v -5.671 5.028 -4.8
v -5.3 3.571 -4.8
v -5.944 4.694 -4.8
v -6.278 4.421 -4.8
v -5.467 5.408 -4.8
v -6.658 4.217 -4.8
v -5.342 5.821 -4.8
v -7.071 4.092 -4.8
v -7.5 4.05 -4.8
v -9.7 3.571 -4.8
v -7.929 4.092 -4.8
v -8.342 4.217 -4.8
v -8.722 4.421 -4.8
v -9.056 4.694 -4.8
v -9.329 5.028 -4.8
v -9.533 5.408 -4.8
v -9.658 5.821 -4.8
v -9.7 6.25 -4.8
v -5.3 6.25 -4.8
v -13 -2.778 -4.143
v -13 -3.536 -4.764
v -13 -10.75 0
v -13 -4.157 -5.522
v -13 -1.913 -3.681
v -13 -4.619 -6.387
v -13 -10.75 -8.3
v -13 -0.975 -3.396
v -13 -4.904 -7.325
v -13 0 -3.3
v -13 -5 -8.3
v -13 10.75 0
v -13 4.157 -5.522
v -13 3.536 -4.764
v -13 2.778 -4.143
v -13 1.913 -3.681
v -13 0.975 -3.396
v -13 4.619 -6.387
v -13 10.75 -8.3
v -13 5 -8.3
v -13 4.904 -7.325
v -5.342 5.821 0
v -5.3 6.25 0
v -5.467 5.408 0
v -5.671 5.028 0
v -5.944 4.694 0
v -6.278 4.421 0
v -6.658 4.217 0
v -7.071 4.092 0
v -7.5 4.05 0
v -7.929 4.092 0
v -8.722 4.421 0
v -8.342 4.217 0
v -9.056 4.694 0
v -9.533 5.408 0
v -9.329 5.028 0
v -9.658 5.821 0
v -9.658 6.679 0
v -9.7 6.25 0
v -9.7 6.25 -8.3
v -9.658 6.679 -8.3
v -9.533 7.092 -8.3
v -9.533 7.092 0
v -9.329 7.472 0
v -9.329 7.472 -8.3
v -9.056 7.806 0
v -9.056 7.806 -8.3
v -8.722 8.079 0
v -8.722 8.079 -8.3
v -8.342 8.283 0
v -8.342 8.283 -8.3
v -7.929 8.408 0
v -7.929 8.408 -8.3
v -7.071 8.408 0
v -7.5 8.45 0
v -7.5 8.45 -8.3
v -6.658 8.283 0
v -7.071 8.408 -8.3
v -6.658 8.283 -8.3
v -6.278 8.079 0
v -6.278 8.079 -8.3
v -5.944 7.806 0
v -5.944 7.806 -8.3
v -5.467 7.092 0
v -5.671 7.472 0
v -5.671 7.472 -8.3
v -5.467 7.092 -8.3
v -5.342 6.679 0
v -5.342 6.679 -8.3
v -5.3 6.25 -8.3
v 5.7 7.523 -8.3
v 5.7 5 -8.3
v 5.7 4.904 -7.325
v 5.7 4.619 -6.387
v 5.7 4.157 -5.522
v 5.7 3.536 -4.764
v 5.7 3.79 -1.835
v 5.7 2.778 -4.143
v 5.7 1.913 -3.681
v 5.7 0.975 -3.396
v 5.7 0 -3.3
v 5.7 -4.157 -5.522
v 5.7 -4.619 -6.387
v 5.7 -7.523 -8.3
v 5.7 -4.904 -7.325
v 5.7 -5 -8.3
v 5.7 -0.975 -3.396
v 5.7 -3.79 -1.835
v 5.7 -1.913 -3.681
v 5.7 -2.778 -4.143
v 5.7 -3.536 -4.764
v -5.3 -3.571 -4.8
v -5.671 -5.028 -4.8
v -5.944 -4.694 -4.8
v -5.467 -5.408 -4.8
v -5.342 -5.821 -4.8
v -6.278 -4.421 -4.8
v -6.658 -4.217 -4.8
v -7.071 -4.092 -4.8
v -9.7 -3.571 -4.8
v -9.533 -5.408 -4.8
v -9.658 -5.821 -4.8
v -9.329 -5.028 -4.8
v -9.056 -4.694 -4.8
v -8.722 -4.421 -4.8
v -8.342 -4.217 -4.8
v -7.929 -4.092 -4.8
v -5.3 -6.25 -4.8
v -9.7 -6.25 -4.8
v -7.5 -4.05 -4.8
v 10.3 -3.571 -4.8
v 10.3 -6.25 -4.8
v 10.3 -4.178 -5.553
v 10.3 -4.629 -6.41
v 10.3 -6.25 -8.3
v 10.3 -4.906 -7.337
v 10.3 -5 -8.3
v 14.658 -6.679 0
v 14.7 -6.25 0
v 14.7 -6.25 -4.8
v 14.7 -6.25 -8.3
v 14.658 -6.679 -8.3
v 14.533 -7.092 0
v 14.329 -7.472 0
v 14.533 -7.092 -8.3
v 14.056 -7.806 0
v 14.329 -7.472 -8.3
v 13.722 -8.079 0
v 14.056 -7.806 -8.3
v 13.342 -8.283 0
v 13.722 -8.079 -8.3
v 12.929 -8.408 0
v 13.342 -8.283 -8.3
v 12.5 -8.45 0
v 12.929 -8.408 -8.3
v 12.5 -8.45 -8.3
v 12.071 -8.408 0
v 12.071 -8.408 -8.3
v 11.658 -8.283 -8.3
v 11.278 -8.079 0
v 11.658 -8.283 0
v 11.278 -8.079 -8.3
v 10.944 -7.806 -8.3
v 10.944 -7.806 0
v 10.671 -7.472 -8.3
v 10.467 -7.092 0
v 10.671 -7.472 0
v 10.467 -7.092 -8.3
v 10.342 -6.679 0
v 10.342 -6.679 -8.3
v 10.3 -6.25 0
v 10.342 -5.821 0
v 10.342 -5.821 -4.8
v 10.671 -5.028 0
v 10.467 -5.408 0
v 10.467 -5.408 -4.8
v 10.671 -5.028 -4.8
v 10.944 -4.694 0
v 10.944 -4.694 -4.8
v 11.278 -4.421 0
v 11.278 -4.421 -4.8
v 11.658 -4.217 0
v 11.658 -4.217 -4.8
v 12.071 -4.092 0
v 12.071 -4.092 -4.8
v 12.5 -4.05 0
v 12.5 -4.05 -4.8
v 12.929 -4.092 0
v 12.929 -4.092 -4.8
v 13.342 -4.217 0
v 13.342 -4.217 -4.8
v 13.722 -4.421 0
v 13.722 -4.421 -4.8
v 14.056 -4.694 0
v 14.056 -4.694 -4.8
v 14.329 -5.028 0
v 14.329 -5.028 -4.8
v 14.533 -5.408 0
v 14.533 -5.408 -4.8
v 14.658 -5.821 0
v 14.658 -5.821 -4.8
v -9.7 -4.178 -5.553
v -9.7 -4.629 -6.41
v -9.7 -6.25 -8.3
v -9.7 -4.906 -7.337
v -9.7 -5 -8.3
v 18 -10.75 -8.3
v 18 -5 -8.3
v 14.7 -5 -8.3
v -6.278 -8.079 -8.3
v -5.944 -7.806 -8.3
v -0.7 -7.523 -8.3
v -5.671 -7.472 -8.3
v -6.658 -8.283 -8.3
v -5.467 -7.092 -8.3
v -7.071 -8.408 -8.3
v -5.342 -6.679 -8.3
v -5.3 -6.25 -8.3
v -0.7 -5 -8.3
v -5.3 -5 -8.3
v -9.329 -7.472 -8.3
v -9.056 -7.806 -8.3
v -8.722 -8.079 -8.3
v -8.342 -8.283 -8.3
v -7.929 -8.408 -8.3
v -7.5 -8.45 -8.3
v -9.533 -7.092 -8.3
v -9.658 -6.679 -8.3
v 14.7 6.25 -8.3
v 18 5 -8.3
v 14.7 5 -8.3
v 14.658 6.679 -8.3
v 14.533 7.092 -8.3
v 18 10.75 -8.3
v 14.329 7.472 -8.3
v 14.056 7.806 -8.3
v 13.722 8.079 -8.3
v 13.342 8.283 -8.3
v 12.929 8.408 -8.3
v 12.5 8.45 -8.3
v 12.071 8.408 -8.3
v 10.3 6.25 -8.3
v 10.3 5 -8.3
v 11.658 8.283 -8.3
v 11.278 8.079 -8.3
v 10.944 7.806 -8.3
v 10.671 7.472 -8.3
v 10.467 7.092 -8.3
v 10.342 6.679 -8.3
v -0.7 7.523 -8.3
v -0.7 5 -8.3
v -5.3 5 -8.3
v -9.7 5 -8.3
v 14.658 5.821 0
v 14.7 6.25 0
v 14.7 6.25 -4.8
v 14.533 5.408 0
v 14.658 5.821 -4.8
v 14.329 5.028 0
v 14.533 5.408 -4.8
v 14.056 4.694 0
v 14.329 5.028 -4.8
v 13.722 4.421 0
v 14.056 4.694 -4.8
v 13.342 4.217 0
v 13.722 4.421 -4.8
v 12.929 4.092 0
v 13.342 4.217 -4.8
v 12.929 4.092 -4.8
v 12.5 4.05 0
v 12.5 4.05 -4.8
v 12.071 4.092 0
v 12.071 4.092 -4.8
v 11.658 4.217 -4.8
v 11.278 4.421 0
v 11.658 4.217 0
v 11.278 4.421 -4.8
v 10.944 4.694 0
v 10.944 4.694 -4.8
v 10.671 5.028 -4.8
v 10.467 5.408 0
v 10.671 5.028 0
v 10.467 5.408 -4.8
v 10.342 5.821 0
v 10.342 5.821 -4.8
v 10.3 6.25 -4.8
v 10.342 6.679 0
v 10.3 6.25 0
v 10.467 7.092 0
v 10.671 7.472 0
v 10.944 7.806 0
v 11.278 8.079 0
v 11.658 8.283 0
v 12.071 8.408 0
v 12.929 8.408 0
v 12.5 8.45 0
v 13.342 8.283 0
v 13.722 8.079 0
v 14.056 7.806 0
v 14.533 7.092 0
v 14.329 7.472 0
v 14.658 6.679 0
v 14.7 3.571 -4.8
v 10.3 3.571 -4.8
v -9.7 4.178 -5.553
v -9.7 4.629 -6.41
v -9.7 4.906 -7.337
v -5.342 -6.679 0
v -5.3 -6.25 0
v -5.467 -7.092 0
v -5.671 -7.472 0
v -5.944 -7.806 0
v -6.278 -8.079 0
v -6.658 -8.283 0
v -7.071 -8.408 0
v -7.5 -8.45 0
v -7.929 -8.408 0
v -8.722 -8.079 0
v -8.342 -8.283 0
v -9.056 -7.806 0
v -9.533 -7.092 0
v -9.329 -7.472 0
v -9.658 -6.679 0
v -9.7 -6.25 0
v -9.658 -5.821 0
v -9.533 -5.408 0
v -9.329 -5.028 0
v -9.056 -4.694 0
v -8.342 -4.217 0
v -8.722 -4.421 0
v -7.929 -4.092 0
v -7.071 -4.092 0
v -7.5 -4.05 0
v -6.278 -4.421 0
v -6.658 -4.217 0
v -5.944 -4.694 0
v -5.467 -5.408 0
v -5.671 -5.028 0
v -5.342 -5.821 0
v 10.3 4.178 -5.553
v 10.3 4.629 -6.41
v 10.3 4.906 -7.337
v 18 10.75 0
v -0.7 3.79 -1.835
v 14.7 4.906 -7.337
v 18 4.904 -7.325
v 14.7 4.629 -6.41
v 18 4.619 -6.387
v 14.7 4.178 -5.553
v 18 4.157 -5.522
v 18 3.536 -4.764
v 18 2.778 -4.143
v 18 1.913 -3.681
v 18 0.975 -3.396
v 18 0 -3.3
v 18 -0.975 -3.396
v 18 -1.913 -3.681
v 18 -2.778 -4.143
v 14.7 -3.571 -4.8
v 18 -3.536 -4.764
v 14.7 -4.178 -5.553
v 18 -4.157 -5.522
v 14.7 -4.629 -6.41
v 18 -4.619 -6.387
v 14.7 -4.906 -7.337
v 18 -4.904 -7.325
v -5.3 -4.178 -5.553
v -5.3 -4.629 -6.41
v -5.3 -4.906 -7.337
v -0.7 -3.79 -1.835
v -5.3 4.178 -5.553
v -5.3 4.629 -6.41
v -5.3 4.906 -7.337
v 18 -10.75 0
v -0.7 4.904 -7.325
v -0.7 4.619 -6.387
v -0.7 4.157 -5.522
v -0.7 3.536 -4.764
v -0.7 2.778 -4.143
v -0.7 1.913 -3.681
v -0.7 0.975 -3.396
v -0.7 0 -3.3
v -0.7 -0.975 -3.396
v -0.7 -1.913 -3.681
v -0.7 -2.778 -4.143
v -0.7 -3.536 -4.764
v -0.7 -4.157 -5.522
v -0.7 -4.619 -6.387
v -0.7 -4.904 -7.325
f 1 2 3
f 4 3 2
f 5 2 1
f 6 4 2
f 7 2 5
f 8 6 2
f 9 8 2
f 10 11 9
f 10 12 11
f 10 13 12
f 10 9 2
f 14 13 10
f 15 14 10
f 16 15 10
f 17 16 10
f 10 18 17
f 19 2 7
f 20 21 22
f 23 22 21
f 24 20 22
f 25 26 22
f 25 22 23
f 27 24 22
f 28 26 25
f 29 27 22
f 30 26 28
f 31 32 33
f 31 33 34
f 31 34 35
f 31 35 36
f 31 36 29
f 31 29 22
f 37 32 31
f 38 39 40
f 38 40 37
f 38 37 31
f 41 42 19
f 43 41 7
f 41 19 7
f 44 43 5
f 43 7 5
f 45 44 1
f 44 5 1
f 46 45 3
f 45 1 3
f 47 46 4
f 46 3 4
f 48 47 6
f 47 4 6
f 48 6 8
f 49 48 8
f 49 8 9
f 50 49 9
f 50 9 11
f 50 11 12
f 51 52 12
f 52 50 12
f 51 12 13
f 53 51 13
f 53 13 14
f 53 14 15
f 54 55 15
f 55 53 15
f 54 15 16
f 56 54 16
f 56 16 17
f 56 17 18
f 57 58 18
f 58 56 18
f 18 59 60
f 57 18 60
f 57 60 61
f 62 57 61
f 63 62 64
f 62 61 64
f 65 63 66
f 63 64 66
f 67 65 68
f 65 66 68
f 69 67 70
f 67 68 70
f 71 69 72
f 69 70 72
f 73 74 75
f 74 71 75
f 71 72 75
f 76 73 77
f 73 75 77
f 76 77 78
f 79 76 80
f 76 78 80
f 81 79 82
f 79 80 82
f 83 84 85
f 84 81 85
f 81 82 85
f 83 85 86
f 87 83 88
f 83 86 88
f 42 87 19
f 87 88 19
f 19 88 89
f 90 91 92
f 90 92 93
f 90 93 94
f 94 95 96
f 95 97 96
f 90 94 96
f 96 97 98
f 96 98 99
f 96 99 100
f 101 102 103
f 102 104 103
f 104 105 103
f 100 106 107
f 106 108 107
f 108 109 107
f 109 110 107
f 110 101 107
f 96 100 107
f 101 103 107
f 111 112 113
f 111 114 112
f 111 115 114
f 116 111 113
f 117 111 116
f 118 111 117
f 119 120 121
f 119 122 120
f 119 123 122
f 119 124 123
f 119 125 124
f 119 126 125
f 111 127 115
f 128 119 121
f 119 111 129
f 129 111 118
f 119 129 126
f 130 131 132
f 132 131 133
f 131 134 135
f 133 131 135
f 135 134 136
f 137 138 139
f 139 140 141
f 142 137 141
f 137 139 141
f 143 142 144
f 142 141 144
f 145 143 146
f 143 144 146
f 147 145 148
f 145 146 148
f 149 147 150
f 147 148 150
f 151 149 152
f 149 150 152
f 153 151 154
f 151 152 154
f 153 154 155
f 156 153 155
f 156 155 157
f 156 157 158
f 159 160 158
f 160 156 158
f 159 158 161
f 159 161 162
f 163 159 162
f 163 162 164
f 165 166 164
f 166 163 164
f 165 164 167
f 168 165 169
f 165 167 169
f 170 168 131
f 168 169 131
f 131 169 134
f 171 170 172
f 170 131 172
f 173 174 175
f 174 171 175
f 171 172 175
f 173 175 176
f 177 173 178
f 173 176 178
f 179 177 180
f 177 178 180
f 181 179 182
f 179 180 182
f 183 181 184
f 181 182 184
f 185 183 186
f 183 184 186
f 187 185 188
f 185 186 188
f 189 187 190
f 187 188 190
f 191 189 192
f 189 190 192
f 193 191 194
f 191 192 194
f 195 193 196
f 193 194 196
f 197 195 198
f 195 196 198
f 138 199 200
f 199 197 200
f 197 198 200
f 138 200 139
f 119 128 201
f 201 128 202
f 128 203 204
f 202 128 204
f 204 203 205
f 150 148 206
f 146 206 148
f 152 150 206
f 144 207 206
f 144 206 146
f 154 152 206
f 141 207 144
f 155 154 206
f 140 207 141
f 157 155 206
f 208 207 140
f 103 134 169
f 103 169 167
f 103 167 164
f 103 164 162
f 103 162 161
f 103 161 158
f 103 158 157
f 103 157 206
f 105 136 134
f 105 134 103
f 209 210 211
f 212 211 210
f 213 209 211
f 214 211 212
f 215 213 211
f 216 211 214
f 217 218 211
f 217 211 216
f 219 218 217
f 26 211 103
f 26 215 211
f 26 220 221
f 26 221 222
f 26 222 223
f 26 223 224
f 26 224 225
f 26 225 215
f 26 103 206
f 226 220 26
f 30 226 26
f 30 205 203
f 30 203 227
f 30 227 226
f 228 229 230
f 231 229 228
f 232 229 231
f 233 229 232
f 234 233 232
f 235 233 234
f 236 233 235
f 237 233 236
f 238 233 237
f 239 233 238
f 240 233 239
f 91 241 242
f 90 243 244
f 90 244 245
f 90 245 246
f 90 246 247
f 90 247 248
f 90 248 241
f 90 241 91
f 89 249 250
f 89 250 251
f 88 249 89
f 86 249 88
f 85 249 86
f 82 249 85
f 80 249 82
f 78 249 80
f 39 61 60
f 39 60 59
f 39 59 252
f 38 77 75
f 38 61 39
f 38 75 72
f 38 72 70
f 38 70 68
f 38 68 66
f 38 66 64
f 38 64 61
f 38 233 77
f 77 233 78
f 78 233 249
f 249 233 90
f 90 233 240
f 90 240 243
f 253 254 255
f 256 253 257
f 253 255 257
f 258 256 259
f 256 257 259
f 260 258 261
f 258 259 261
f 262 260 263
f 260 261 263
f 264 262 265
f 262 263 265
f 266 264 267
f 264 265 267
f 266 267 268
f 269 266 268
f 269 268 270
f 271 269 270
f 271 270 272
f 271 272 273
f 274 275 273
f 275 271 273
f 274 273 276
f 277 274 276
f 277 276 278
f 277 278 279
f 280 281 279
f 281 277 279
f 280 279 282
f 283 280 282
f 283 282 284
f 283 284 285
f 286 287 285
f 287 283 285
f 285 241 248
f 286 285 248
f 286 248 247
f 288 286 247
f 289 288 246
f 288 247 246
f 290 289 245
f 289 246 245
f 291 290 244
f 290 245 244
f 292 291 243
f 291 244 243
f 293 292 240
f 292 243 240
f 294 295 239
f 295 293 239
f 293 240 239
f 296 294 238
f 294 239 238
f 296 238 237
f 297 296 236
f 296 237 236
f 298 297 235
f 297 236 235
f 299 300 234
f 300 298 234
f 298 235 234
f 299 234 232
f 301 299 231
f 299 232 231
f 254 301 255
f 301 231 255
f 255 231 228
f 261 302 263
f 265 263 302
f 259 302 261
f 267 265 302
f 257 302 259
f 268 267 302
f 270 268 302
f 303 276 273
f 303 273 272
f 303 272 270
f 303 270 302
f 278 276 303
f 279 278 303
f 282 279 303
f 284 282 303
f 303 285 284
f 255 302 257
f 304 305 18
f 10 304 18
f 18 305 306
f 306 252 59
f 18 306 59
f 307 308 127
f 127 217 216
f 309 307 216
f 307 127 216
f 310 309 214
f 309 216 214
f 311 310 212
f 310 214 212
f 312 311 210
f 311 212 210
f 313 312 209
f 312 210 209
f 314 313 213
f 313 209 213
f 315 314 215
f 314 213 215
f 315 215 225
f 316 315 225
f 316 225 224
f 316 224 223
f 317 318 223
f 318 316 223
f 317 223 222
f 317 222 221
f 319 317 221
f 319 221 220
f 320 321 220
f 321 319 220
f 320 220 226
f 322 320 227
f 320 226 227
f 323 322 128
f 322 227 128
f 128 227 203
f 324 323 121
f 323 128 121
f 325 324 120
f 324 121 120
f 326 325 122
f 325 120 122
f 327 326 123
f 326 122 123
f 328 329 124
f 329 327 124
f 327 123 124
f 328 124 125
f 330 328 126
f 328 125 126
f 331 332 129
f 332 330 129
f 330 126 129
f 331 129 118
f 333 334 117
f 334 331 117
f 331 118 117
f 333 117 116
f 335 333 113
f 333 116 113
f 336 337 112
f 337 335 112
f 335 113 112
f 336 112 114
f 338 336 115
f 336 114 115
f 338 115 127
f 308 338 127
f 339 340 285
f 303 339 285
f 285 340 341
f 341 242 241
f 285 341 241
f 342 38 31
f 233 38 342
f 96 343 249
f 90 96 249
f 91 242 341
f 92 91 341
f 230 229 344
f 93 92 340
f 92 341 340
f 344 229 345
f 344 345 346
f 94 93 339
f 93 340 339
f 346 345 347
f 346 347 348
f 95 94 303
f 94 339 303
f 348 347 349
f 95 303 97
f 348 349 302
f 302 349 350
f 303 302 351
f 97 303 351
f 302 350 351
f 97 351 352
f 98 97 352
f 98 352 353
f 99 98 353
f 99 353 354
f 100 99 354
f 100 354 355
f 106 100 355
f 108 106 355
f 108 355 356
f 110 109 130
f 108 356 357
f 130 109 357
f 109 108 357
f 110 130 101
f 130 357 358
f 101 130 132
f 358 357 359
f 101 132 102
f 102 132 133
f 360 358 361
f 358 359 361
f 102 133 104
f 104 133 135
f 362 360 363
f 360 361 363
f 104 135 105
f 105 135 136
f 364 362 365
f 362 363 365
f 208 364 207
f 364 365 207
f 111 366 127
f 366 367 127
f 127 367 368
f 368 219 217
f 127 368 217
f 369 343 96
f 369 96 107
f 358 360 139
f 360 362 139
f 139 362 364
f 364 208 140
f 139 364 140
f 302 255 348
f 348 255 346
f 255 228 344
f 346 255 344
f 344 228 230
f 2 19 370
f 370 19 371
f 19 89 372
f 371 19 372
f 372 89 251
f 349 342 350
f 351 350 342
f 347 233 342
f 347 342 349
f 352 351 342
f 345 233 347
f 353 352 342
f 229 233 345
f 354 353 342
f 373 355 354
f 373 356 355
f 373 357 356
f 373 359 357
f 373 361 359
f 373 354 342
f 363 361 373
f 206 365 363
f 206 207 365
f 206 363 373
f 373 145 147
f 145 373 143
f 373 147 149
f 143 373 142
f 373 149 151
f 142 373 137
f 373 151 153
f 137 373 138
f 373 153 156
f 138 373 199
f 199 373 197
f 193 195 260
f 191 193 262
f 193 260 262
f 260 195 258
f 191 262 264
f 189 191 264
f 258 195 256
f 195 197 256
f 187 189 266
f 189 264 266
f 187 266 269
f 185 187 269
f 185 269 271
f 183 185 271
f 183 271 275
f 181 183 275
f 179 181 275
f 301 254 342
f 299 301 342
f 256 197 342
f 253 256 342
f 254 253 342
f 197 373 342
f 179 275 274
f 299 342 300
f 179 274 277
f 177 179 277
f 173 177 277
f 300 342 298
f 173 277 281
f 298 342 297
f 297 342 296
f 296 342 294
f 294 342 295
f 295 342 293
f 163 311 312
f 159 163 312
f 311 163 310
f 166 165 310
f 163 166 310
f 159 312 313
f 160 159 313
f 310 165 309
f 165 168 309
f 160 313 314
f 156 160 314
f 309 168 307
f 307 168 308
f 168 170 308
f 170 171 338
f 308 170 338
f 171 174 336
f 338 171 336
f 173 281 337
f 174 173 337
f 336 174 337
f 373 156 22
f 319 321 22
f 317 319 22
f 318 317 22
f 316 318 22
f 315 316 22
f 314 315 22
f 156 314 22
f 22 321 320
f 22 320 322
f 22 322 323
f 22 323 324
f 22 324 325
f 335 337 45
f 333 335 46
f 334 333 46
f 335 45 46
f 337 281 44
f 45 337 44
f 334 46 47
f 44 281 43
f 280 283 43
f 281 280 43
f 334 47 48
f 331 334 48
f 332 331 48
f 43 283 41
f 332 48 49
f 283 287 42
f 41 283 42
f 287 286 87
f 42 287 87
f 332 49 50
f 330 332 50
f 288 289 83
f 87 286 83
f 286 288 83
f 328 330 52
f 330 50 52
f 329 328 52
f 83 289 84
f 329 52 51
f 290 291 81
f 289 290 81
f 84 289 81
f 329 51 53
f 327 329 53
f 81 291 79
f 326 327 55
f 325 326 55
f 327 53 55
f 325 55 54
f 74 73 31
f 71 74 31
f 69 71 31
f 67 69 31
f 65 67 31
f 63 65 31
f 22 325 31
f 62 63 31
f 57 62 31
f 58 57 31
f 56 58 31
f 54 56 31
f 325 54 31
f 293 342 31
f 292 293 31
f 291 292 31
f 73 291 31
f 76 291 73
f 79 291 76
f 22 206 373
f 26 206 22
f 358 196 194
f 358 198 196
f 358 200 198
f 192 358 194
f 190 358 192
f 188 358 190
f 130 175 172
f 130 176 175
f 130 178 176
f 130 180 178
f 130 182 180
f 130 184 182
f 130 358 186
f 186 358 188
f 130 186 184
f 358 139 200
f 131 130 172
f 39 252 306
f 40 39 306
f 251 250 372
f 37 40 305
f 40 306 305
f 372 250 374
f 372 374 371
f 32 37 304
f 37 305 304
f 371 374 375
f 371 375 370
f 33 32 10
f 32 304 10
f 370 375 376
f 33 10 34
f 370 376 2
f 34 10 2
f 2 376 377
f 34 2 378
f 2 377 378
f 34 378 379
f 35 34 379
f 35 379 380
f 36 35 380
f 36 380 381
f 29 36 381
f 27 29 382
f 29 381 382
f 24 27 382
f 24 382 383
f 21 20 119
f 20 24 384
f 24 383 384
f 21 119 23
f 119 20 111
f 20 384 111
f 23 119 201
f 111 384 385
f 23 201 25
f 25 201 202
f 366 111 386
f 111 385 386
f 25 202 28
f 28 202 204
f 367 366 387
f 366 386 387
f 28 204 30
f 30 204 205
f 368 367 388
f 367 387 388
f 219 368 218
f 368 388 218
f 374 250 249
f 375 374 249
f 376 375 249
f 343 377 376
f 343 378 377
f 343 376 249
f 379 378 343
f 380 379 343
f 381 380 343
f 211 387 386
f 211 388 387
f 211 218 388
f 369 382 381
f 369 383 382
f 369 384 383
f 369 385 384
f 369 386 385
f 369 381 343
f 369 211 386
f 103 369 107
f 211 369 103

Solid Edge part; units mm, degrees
sketch "Sketch1" plane through (0, 0, -8.3) normal (0, 0, 1) x (1, 0, 0)
  circle A0 centre (-7.5, -6.25) radius 2.2
  circle A1 centre (12.5, -6.25) radius 2.2
  circle A2 centre (12.5, 6.25) radius 2.2
  line L0 (-13, 10.75) -> (18, 10.75)
  line L1 (18, 10.75) -> (18, -10.75)
  line L2 (18, -10.75) -> (-13, -10.75)
  line L3 (-13, -10.75) -> (-13, 10.75)
  circle A3 centre (-7.5, 6.25) radius 2.2
  dimension "D1" = 20
  dimension "D2" = 4.4
  dimension "D3" = 12.5
  dimension "D4" = 31
  dimension "D5" = 31
extrude "Protrusion1" add sketch "Sketch1" along normal up to vertex (8.3 mm away)
sketch "Sketch2" plane through (2.5, 18.75, -4.15) normal (1, 0, 0) x (0, 1, 0)
  line L0 (-11.2268, -4.15) -> (-14.9595, 2.3153)
  line L1 (-14.9595, 2.3153) -> (-22.5405, 2.3153)
  line L2 (-22.5405, 2.3153) -> (-26.2732, -4.15)
  dimension "D1" = 0.2
extrude "ExtrudedCutout_1" cut sketch "Sketch2" along normal mid plane 6.4 material side at (2.5, 5.6135, -5.0923)
sketch "Sketch3" plane through (18, 18.75, -4.15) normal (1, 0, 0) x (0, -1, 0)
  circle A0 centre (18.75, 4.15) radius 5
  dimension "D1" = 10
extrude "Cutout1" cut sketch "Sketch3" against normal through all
sketch "Sketch4" plane through (2.5, 7.875, -8.3) normal (0, 0, -1) x (-1, 0, 0)
  line L0 (-12.2, -1.625) -> (-12.2, -14.125)
  line L1 (-7.8, -14.125) -> (-7.8, -1.625)
  arc A0 (-7.8, -14.125) -> (-12.2, -14.125) centre (-10, -14.125) ccw
  arc A1 (-7.8, -1.625) -> (-12.2, -1.625) centre (-10, -1.625) cw
  line L2 (7.8, -1.625) -> (7.8, -14.125)
  arc A2 (12.2, -14.125) -> (7.8, -14.125) centre (10, -14.125) cw
  line L3 (12.2, -14.125) -> (12.2, -1.625)
  arc A3 (12.2, -1.625) -> (7.8, -1.625) centre (10, -1.625) ccw
extrude "ExtrudedCutout_4" cut sketch "Sketch4" against normal blind 3.5
properties material "ABS Plastic, medium impact"
